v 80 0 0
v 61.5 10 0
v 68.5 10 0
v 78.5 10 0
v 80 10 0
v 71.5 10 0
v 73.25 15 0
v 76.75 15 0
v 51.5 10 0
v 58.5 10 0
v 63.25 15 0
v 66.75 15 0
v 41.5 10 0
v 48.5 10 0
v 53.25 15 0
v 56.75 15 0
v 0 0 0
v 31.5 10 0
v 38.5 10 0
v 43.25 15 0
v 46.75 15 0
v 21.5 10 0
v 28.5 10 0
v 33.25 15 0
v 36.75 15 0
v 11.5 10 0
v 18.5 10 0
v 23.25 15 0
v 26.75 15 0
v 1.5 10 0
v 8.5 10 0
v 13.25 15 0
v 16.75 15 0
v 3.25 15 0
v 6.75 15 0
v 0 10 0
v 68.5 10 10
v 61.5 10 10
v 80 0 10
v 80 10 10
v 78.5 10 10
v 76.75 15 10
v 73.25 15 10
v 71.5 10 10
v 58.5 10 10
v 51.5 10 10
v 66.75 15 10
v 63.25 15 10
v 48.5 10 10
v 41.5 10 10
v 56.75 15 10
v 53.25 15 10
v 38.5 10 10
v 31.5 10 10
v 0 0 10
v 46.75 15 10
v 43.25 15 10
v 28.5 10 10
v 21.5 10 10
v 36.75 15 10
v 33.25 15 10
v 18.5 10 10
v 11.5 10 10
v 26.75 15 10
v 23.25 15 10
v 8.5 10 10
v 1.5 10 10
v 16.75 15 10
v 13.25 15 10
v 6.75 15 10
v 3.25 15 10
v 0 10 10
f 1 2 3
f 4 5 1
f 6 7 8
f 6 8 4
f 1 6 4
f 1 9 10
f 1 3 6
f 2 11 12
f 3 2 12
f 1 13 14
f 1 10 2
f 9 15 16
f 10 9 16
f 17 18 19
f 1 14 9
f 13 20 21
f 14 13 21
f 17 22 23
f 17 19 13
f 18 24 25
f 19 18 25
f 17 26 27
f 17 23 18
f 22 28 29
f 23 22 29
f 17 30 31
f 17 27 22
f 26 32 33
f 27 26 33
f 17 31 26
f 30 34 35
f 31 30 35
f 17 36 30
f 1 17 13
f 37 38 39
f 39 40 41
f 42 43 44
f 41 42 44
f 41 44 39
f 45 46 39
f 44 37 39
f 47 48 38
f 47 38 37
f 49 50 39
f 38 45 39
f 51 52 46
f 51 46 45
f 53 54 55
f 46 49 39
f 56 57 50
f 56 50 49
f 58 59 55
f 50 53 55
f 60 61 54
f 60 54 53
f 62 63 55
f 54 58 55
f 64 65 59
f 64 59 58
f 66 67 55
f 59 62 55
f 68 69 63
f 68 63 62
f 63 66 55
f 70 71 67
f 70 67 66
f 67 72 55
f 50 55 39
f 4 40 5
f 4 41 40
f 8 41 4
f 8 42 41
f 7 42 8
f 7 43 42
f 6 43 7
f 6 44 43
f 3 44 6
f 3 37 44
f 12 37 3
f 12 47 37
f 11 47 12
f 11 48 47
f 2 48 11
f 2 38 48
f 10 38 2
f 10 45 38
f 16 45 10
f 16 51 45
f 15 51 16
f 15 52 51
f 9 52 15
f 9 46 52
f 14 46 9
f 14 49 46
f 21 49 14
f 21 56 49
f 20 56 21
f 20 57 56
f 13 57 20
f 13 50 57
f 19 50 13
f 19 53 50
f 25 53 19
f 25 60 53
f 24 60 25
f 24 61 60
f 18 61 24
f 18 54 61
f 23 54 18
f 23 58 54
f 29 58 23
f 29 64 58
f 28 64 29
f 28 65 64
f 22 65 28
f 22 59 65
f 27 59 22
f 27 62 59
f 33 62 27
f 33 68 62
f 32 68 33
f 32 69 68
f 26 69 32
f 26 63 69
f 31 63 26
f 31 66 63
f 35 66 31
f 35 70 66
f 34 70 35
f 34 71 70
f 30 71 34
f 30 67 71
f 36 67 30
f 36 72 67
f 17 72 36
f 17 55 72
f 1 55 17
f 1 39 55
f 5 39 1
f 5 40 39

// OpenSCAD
$fn = 32;

// ----------------------------------------------------------------------
// Gear rack: 8 teeth, pitch 10 mm
// ----------------------------------------------------------------------

// --- parameters (mm) ---
teeth = 8;                // number of teeth
pitch = 10;               // tooth pitch, X
root_w = 7;               // tooth width at the root
tip_w = 3.5;              // tooth width at the tip
base_h = 10;              // rack body height, Y
tooth_h = 5;              // tooth height above the body
plate_t = 10;             // rack width, Z (extrusion height)

rack_l = teeth * pitch;  // overall length
total_h = base_h + tooth_h;  // overall height

profile = [[0, 0], [80, 0], [80, 10], [78.5, 10], [76.75, 15], [73.25, 15], [71.5, 10], [68.5, 10], [66.75, 15], [63.25, 15], [61.5, 10], [58.5, 10], [56.75, 15], [53.25, 15], [51.5, 10], [48.5, 10], [46.75, 15], [43.25, 15], [41.5, 10], [38.5, 10], [36.75, 15], [33.25, 15], [31.5, 10], [28.5, 10], [26.75, 15], [23.25, 15], [21.5, 10], [18.5, 10], [16.75, 15], [13.25, 15], [11.5, 10], [8.5, 10], [6.75, 15], [3.25, 15], [1.5, 10], [0, 10]];  // primary outline, 36 points, counter clockwise

// --- the one profile operation ---
linear_extrude(height = plate_t) polygon(points = profile);
